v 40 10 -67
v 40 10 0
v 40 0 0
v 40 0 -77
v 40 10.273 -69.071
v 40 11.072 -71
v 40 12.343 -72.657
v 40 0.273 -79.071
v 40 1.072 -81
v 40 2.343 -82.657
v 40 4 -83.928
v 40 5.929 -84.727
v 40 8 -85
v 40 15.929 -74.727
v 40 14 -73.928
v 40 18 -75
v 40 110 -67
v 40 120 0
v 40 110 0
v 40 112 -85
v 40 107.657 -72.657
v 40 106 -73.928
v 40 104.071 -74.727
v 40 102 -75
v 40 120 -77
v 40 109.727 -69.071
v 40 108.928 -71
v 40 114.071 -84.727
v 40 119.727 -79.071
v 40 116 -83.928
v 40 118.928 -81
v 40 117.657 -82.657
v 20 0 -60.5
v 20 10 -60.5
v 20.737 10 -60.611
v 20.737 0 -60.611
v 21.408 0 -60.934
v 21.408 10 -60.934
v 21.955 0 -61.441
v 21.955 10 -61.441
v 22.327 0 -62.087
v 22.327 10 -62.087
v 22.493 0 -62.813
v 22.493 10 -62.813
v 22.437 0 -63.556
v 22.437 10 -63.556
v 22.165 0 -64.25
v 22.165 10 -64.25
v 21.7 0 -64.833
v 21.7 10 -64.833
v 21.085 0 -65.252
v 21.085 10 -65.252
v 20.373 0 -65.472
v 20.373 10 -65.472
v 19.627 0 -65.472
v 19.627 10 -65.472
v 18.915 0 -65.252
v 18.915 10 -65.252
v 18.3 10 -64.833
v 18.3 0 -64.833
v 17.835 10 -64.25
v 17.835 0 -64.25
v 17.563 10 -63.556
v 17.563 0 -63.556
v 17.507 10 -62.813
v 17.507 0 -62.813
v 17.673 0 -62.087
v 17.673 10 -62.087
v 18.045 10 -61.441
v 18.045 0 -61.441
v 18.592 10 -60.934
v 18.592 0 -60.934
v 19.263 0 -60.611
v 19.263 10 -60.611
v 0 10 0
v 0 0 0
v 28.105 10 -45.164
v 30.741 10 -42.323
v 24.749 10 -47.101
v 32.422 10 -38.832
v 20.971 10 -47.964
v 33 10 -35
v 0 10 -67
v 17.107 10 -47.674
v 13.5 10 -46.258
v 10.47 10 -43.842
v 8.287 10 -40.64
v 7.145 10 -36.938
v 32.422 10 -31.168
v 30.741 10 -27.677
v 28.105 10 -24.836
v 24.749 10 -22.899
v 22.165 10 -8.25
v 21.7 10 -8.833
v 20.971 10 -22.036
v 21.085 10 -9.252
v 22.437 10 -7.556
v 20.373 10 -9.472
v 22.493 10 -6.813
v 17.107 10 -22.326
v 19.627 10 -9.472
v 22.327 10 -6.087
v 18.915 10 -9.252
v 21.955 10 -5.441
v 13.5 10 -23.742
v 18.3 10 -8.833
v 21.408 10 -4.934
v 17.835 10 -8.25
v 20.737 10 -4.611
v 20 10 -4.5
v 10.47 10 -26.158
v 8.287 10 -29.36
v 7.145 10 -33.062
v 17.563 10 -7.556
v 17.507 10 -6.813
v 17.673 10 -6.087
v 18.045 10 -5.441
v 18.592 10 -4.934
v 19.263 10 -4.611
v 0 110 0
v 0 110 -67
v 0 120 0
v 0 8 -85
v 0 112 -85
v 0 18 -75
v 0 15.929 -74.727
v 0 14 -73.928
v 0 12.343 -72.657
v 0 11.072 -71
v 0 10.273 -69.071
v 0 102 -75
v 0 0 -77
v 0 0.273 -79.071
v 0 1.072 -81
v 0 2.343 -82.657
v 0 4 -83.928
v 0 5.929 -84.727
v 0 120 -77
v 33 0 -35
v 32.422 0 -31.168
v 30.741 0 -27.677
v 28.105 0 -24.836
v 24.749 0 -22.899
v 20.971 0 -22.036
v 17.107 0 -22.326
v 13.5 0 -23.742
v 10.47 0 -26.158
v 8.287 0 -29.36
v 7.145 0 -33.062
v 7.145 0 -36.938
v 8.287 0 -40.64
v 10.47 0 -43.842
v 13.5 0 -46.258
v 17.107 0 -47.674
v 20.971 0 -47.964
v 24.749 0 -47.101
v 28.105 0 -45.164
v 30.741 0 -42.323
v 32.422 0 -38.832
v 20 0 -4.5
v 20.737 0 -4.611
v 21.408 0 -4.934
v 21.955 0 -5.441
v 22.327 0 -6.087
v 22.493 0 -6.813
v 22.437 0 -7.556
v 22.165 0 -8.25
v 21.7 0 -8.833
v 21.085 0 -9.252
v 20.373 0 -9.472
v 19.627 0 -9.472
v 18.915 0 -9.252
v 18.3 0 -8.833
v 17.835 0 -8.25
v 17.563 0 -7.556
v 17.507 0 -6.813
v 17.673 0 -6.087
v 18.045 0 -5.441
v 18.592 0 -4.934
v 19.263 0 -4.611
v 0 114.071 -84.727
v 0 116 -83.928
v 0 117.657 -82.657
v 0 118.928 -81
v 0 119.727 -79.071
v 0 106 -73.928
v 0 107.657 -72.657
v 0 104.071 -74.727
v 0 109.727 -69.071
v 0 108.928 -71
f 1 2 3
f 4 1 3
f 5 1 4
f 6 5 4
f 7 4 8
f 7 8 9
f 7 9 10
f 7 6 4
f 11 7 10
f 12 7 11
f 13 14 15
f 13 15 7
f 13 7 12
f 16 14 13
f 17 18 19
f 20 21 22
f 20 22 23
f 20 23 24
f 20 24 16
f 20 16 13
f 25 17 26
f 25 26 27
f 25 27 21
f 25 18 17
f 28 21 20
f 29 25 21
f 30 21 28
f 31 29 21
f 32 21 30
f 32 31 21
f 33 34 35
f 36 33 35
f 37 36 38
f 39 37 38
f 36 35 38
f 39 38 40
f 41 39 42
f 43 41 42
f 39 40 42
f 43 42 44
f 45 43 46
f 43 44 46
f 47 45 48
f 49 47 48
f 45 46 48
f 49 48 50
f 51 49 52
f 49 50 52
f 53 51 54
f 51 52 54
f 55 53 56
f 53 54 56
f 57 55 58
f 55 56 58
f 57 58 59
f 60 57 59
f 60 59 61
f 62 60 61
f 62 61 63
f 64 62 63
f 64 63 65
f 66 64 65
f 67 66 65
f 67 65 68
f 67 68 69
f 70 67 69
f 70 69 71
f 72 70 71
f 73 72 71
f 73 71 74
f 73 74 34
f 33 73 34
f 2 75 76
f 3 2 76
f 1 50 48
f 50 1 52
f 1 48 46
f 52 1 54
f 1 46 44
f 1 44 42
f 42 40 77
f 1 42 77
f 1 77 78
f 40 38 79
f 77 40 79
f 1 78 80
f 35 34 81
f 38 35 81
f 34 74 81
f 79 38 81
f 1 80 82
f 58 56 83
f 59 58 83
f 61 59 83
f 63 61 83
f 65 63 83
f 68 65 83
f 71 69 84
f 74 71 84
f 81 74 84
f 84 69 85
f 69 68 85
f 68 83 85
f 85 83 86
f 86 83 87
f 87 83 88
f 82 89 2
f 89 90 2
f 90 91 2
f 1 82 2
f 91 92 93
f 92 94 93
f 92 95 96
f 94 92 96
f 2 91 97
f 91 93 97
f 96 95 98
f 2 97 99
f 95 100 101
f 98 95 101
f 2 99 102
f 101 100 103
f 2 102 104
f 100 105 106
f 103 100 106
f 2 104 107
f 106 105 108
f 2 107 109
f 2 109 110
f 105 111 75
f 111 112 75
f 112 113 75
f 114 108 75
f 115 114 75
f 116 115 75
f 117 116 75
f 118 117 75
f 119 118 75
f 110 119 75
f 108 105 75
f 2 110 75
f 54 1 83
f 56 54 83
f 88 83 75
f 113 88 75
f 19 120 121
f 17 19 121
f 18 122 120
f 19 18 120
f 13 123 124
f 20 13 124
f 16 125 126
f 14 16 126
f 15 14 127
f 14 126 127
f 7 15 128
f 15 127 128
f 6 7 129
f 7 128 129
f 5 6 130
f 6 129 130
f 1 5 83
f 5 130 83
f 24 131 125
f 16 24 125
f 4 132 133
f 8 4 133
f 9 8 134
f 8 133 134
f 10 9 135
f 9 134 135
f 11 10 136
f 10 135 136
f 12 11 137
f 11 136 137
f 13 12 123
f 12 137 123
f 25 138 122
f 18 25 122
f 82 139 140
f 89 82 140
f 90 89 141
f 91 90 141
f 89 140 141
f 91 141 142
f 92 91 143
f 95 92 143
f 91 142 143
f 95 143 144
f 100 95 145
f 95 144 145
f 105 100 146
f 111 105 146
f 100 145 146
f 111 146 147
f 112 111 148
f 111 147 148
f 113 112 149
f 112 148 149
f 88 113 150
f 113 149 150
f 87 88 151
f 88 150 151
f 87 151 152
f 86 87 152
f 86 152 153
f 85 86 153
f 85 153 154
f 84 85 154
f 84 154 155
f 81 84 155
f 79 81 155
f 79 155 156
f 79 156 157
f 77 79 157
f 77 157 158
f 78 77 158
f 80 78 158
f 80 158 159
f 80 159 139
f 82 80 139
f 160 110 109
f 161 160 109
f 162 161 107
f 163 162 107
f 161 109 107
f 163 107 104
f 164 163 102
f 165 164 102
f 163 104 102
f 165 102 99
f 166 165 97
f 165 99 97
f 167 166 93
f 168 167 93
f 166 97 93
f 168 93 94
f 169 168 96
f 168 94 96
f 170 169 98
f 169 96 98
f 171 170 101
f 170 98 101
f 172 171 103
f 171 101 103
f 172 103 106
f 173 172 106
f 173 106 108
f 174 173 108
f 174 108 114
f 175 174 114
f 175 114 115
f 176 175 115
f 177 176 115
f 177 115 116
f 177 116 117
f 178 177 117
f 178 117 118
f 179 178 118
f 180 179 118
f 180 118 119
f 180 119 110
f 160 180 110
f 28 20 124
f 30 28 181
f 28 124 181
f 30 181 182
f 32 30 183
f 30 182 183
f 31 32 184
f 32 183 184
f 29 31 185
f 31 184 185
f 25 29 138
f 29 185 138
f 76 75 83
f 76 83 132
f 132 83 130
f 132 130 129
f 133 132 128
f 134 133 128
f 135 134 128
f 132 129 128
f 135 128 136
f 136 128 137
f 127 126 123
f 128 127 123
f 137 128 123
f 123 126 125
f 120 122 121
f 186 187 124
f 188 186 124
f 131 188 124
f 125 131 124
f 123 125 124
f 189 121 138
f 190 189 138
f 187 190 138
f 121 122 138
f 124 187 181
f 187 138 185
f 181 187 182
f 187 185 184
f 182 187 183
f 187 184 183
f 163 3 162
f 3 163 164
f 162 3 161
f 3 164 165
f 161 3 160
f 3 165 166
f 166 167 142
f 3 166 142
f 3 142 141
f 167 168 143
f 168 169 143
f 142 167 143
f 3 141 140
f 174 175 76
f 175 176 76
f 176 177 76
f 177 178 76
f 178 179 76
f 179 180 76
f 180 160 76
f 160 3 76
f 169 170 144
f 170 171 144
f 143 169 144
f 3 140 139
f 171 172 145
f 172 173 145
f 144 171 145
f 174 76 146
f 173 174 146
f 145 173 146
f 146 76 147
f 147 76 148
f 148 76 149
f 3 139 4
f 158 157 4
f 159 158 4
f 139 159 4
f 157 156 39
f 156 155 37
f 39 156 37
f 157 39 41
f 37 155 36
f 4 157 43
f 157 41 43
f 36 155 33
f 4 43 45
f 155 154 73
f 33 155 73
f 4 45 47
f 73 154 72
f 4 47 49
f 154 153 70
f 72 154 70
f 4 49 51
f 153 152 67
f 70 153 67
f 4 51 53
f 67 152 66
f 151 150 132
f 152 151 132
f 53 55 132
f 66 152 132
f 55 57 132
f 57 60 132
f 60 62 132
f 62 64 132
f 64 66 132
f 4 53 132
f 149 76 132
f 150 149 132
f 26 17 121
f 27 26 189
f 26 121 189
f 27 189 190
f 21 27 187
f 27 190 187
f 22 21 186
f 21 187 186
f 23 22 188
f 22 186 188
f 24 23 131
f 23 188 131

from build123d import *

# Parameters (mm, degrees)
EXTRUDE_1_DEPTH        = 40
CUT_EXTRUDE_1_REACH    = 122
SKETCH_5_R             = 13
HOLE_WIZARD_M6_1_D     = 5
HOLE_WIZARD_M6_1_DEPTH = 10


with BuildPart() as part:
    # 草图1 → 凸台-拉伸1 (new body)
    with BuildSketch(Plane(origin=(0, 0, 0), x_dir=(0, 0, -1), z_dir=(1, 0, 0))):
        with BuildLine():
            Line((0, 0), (77, 0))
            ThreePointArc((77, 0), (82.656854249, 2.343145751), (85, 8))
            Line((85, 8), (85, 112))
            ThreePointArc((85, 112), (82.656854249, 117.656854249), (77, 120))
            Line((77, 120), (0, 120))
            Line((0, 120), (0, 110))
            Line((0, 110), (67, 110))
            ThreePointArc((67, 110), (72.656854249, 107.656854249), (75, 102))
            Line((75, 102), (75, 18))
            ThreePointArc((75, 18), (72.656854249, 12.343145751), (67, 10))
            Line((67, 10), (0, 10))
            Line((0, 10), (0, 0))
        make_face()
    extrude(amount=EXTRUDE_1_DEPTH)

    # 草图5 → 切除-拉伸1 (cut, up to next)
    with BuildSketch(Plane.XZ, mode=Mode.PRIVATE) as cut_extrude_1_sk1:
        with Locations((20, -35)):
            Circle(SKETCH_5_R)
    cut_extrude_1_tool1 = extrude(cut_extrude_1_sk1.sketch, amount=-CUT_EXTRUDE_1_REACH, mode=Mode.PRIVATE) & part.part
    add(cut_extrude_1_tool1.solids().sort_by_distance((20, 0, -35))[0], mode=Mode.SUBTRACT)

    # M6 螺纹孔1
    with Locations(Plane(origin=(20, 0, -7), x_dir=(0, 0, -1), z_dir=(0, -1, 0))):
        with Locations((0, 0), (56, 0)):
            Hole(HOLE_WIZARD_M6_1_D / 2, depth=HOLE_WIZARD_M6_1_DEPTH)


solid = part.part
